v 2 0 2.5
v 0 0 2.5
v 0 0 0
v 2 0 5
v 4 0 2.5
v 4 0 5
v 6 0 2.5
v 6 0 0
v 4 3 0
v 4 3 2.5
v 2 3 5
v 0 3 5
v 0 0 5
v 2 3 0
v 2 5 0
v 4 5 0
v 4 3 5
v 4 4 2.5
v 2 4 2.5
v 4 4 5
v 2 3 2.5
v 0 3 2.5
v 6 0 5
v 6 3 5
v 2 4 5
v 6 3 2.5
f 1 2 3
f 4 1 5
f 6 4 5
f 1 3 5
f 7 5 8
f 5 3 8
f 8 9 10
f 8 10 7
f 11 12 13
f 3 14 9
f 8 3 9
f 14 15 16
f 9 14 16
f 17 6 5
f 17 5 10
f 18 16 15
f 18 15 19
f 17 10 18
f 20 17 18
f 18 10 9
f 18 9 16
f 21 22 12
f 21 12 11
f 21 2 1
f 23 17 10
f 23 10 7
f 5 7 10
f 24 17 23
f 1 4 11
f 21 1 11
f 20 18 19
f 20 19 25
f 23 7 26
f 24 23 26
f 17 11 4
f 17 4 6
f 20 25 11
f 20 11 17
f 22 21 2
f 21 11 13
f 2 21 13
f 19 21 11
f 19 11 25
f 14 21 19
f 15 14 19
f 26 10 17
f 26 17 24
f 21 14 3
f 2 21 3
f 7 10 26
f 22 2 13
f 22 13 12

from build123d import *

# Parameters (mm, degrees)
SKETCH1_W           = 6
SKETCH1_H           = 3
SKETCH1_W_2         = 2
SKETCH1_H_2         = 2
BOSS_EXTRUDE1_DEPTH = 5
CUT_EXTRUDE2_DEPTH  = 5
CUT_EXTRUDE14_DEPTH = 2.5
CUT_EXTRUDE15_DEPTH = 2.5
CUT_EXTRUDE17_DEPTH = 2.5
CUT_EXTRUDE18_DEPTH = 2.5


with BuildPart() as part:
    # Sketch1 → Boss-Extrude1 (new body)
    with BuildSketch(Plane.XY):
        with Locations((3, 1.5)):
            Rectangle(SKETCH1_W, SKETCH1_H)
        with Locations((3, 4)):
            Rectangle(SKETCH1_W_2, SKETCH1_H_2)
    extrude(amount=BOSS_EXTRUDE1_DEPTH)

    # Sketch2 → Cut-Extrude2 (cut)
    with BuildSketch(Plane(origin=(4, 0, 0), x_dir=(0, 0, -1), z_dir=(1, 0, 0))):
        Polygon((0, 5), (-2.5, 4), (-5, 4), (-5, 5), align=None)
    extrude(amount=-CUT_EXTRUDE2_DEPTH, mode=Mode.SUBTRACT)

    # Sketch8 → Cut-Extrude14 (cut)
    with BuildSketch(Plane(origin=(0, 0, 0), x_dir=(-1, 0, 0), z_dir=(0, 0, -1))):
        Polygon((-4, 3), (-6, 0), (-6, 3), align=None)
    extrude(amount=-CUT_EXTRUDE14_DEPTH, mode=Mode.SUBTRACT)

    # Sketch9 → Cut-Extrude15 (cut)
    with BuildSketch(Plane.XY.offset(5)):
        Polygon((4, 3), (6, 0), (4, 0), align=None)
    extrude(amount=-CUT_EXTRUDE15_DEPTH, mode=Mode.SUBTRACT)

    # Sketch11 → Cut-Extrude17 (cut)
    with BuildSketch(Plane(origin=(0, 0, 0), x_dir=(-1, 0, 0), z_dir=(0, 0, -1))):
        Polygon((0, 3), (-2, 3), (0, 0), align=None)
    extrude(amount=-CUT_EXTRUDE17_DEPTH, mode=Mode.SUBTRACT)

    # Sketch10 → Cut-Extrude18 (cut)
    with BuildSketch(Plane.XY.offset(5)):
        Polygon((2, 3), (0, 0), (2, 0), align=None)
    extrude(amount=-CUT_EXTRUDE18_DEPTH, mode=Mode.SUBTRACT)


solid = part.part
